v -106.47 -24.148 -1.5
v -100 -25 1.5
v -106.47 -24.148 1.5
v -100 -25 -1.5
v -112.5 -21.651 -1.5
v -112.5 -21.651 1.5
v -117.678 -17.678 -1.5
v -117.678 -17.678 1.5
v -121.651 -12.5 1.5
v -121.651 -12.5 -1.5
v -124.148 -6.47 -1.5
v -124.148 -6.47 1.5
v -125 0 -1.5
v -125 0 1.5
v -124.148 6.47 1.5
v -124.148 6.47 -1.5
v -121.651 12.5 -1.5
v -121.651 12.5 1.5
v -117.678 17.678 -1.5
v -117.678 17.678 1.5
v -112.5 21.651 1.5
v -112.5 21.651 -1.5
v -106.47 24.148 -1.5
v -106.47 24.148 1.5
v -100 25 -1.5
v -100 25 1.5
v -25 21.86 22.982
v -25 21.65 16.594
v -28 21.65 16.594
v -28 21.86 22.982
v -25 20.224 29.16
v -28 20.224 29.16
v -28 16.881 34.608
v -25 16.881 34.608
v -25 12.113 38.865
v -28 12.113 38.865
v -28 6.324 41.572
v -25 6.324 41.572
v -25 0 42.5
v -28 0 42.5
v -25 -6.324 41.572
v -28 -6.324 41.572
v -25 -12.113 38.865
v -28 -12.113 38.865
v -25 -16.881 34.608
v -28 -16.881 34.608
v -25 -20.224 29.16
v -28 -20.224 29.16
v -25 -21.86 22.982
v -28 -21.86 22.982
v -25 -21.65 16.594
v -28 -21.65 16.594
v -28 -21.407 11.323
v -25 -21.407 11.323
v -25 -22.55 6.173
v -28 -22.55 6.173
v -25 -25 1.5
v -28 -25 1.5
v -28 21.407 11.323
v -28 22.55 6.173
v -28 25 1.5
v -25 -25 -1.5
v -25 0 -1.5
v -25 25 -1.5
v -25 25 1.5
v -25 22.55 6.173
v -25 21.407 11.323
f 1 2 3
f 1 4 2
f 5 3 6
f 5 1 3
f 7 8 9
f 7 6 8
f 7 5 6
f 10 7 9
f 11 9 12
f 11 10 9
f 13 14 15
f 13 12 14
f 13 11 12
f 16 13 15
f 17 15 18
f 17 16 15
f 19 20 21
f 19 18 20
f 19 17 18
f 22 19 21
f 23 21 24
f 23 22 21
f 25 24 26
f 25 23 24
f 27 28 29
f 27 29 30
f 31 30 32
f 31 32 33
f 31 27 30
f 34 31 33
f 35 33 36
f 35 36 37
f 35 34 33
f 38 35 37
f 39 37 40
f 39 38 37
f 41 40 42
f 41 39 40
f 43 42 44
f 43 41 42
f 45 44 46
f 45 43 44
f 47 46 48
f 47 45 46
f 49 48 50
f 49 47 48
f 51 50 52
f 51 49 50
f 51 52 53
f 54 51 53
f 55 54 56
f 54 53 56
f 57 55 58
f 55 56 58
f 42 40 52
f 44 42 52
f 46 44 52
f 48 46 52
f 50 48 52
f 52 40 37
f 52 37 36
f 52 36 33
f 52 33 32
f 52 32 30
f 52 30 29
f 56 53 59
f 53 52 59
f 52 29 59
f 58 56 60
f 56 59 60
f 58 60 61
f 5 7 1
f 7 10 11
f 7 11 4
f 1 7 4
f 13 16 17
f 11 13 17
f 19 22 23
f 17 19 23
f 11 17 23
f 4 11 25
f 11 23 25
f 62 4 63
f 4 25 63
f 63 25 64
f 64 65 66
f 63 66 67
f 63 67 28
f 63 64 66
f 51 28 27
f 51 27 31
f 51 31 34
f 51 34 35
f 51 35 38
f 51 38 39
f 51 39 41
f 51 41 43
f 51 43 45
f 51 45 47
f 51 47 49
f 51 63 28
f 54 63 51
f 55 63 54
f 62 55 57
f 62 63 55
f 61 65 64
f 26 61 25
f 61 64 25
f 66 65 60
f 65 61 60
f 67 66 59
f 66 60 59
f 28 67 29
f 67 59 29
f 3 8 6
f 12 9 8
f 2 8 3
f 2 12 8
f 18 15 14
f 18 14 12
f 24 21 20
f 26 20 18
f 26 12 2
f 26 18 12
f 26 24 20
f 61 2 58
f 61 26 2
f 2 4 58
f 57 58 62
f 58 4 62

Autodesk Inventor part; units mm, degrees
ref_plane "YZ Plane" through (0, 0, 0) normal (1, 0, 0) x (0, 1, 0)
ref_plane "XZ Plane" through (0, 0, 0) normal (0, 1, 0) x (-1, 0, 0)
ref_plane "XY Plane" through (0, 0, 0) normal (0, 0, 1) x (1, 0, 0)
sketch "草圖1" plane through (0, 0, 0) normal (0, 0, 1) x (1, 0, 0)
  line L0 (0, 0) -> (-100, 0) construction
  line L1 (0, 25) -> (-100, 25)
  line L2 (-100, -25) -> (0, -25)
  arc A0 (0, -25) -> (0, 25) centre (0, 0) ccw
  arc A1 (-100, 25) -> (-100, -25) centre (-100, 0) ccw
  circle A2 centre (0, 0) radius 25
  line L3 (-25, 25) -> (-25, -25)
  point P0 (-50, 0)
  point P1 (25, 0)
  point P2 (-125, 0)
  dimension "d0" = 50
  dimension "d1" = 150
extrude "擠出1" add sketch "草圖1" along normal mid plane 3 contours L3 L2 A1 L1
sketch "草圖2" plane through (-25, -25, 1.5) normal (1, 0, 0) x (0, 0, -1)
  circle A0 centre (-19, 25) radius 22
  line L0 (3, 50) -> (3, 0) construction
  point P0 (1.5, 25)
  point P1 (3, 25)
  dimension "d4" = 44
extrude "擠出2" add sketch "草圖2" against normal blind 3
fillet "圓角1" radius 20 2 edges at (-26.5, 11.0905, 1.5) (-26.5, -11.0905, 1.5)
sketch "草圖3" plane through (0, 0, 1.5) normal (0, 0, 1) x (1, 0, 0)
  line L0 (-94.9774, -1.6071) -> (-72.1571, -1.6071) construction
  line L1 (-72.1571, -1.6071) -> (-72.1571, -15.4278) construction
  line L2 (-72.1571, -15.4278) -> (-94.9774, -15.4278) construction
  line L3 (-94.9774, -15.4278) -> (-94.9774, -1.6071) construction
  point P0 (0, 0)
properties part number "Arm_4"
